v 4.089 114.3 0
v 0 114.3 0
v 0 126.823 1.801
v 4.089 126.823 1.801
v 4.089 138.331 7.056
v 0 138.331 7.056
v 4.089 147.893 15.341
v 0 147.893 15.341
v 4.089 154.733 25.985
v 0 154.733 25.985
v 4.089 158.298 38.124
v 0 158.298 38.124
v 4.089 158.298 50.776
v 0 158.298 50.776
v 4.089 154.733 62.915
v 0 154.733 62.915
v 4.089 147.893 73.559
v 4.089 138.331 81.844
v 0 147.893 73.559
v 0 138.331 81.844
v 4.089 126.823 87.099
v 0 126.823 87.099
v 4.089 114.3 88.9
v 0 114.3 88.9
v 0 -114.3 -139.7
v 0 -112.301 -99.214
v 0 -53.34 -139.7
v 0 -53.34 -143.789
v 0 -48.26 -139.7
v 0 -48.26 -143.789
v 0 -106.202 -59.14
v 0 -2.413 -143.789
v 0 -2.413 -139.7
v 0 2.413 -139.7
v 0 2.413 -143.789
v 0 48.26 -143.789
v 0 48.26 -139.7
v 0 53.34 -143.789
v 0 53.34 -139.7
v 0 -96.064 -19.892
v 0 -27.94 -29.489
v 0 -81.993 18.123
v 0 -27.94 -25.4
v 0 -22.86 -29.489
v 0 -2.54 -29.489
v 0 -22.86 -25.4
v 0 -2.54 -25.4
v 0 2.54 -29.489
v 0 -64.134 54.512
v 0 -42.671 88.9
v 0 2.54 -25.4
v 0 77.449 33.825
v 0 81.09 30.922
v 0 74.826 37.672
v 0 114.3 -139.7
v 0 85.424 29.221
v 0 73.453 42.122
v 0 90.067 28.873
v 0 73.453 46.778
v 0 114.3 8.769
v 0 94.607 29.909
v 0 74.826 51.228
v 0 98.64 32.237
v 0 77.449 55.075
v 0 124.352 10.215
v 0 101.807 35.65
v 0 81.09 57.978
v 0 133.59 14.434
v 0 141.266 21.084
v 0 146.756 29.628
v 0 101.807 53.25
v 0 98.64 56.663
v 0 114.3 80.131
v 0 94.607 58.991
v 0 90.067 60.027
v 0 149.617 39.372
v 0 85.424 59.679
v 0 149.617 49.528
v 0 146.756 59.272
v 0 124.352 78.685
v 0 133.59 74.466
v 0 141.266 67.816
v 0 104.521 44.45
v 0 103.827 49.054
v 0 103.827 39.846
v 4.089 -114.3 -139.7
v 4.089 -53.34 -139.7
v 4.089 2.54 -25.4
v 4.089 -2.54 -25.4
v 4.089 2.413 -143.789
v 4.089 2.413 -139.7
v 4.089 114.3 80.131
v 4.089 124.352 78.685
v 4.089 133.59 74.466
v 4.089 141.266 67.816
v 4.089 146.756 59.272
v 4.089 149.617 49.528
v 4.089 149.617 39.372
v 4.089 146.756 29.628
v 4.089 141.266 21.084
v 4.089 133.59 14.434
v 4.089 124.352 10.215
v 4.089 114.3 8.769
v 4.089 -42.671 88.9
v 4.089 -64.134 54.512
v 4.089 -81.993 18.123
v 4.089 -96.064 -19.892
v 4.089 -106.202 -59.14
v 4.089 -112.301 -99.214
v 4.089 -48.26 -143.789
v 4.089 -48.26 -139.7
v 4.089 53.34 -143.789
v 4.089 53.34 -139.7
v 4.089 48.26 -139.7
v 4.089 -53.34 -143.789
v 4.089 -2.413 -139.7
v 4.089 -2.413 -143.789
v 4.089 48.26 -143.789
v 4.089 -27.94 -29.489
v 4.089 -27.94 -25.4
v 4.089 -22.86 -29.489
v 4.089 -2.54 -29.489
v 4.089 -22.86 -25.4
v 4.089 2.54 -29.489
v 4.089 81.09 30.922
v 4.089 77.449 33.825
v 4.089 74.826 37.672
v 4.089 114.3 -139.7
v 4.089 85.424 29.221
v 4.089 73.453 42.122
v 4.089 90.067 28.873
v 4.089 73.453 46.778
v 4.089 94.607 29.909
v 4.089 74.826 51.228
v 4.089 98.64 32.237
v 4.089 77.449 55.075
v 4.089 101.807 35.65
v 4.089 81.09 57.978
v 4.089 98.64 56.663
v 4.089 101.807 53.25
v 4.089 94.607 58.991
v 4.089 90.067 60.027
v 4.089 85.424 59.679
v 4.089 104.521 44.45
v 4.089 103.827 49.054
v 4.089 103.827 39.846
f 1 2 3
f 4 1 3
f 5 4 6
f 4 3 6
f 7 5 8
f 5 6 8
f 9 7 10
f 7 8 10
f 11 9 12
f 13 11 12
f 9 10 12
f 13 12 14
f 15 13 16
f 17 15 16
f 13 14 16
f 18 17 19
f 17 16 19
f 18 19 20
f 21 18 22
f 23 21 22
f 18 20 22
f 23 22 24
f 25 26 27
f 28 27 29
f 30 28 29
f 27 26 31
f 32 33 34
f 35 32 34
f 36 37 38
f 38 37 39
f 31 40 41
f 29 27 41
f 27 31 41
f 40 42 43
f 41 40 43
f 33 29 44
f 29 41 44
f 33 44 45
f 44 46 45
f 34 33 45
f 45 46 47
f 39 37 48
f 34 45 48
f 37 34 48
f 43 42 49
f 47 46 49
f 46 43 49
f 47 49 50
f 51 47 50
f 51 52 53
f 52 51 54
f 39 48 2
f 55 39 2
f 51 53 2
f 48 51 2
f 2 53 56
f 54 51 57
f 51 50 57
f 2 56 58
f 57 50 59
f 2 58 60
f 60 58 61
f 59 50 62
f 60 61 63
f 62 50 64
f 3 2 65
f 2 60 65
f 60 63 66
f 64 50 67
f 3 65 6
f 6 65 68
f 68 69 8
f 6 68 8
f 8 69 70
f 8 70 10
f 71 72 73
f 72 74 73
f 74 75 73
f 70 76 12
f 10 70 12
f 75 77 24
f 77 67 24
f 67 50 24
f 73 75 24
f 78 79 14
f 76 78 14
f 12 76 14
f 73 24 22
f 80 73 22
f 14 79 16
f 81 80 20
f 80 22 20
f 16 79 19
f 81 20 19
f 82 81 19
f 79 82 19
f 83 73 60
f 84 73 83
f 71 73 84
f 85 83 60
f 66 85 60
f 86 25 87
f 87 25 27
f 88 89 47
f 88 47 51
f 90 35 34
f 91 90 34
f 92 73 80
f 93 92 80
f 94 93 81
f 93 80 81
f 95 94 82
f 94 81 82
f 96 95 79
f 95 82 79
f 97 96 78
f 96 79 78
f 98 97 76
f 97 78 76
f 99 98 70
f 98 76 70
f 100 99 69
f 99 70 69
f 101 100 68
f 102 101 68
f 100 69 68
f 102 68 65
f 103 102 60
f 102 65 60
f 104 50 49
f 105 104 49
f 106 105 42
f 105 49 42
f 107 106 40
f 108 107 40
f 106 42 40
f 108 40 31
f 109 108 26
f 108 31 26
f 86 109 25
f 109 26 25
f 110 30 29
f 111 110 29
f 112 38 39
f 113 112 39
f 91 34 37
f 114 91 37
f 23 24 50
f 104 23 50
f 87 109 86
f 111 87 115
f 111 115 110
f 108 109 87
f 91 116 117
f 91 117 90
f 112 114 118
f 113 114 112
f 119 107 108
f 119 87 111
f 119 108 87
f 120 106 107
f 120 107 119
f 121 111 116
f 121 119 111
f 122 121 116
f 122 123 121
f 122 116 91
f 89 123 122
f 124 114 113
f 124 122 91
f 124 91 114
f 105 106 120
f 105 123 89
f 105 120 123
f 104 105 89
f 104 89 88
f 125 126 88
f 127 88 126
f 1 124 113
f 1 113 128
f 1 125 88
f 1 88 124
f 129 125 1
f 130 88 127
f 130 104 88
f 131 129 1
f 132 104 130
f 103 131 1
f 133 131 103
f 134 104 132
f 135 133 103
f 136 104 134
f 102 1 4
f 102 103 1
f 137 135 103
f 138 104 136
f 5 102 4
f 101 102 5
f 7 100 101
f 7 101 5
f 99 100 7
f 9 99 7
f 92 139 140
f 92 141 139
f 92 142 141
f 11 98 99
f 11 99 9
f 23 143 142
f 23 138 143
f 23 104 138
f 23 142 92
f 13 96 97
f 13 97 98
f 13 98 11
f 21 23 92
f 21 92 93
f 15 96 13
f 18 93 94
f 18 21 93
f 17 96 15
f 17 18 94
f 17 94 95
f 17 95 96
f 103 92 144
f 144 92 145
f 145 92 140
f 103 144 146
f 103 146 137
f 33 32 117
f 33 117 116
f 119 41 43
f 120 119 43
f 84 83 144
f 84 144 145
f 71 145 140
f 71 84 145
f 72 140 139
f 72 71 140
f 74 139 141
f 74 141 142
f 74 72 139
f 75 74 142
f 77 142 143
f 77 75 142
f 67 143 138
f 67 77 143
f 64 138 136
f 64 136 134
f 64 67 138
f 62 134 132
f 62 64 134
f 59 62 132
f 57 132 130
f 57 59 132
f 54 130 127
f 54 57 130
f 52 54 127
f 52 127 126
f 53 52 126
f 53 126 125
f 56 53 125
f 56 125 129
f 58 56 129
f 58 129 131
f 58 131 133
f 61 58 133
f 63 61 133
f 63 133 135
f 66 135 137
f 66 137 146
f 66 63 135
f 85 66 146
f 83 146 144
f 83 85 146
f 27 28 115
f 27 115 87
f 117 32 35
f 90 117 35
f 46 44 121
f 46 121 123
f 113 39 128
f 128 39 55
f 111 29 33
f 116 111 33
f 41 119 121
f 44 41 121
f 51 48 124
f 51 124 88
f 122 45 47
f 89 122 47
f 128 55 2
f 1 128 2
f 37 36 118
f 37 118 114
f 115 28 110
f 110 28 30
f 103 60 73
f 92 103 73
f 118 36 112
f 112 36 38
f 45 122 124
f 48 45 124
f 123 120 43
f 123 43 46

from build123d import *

# Parameters (mm, degrees)
F0_R     = 15.621
F0_W     = 5.08
F0_H     = 4.0894
F0_W_2   = 4.826
F1_DEPTH = 4.0894
F2_W     = 5.08
F2_H     = 4.0894
F3_DEPTH = 25.4


with BuildPart() as f1:
    # F0 (on Right) → F1 (new body)
    with BuildSketch(Plane.YZ):
        with BuildLine():
            Line((53.34, -139.7), (114.3, -139.7))
            Line((114.3, -139.7), (114.3, 0))
            Line((114.3, 0), (114.3, 8.769464))
            Line((114.3, 8.769464), (114.3, 80.130536))
            Line((114.3, 80.130536), (114.3, 88.9))
            Line((114.3, 88.9), (-42.671357, 88.9))
            ThreePointArc((-42.671357, 88.9), (-96.063758, -19.892153), (-114.3, -139.7))
            Line((-114.3, -139.7), (-53.34, -139.7))
            Line((-53.34, -139.7), (-48.26, -139.7))
            Line((-48.26, -139.7), (-2.413, -139.7))
            Line((-2.413, -139.7), (2.413, -139.7))
            Line((2.413, -139.7), (48.26, -139.7))
            Line((48.26, -139.7), (53.34, -139.7))
        make_face()
        with Locations((88.9, 44.45)):
            Circle(F0_R, mode=Mode.SUBTRACT)
        with Locations((50.8, -141.7447)):
            Rectangle(F0_W, F0_H)
        with BuildLine():
            Line((114.3, 8.769464), (114.3, 0))
            ThreePointArc((114.3, 0), (158.75, 44.45), (114.3, 88.9))
            Line((114.3, 88.9), (114.3, 80.130536))
            ThreePointArc((114.3, 80.130536), (149.980536, 44.45), (114.3, 8.769464))
        make_face()
        with Locations((0, -141.7447)):
            Rectangle(F0_W_2, F0_H)
        with Locations((-50.8, -141.7447)):
            Rectangle(F0_W, F0_H)
    extrude(amount=F1_DEPTH)

    # F2 (on face) → F3 (cut)
    with BuildSketch(Plane.YZ.offset(4.0894)):
        with Locations((0, -27.4447)):
            Rectangle(F2_W, F2_H)
        with Locations((-25.4, -27.4447)):
            Rectangle(F2_W, F2_H)
    extrude(amount=-F3_DEPTH, mode=Mode.SUBTRACT)


solid = f1.part
